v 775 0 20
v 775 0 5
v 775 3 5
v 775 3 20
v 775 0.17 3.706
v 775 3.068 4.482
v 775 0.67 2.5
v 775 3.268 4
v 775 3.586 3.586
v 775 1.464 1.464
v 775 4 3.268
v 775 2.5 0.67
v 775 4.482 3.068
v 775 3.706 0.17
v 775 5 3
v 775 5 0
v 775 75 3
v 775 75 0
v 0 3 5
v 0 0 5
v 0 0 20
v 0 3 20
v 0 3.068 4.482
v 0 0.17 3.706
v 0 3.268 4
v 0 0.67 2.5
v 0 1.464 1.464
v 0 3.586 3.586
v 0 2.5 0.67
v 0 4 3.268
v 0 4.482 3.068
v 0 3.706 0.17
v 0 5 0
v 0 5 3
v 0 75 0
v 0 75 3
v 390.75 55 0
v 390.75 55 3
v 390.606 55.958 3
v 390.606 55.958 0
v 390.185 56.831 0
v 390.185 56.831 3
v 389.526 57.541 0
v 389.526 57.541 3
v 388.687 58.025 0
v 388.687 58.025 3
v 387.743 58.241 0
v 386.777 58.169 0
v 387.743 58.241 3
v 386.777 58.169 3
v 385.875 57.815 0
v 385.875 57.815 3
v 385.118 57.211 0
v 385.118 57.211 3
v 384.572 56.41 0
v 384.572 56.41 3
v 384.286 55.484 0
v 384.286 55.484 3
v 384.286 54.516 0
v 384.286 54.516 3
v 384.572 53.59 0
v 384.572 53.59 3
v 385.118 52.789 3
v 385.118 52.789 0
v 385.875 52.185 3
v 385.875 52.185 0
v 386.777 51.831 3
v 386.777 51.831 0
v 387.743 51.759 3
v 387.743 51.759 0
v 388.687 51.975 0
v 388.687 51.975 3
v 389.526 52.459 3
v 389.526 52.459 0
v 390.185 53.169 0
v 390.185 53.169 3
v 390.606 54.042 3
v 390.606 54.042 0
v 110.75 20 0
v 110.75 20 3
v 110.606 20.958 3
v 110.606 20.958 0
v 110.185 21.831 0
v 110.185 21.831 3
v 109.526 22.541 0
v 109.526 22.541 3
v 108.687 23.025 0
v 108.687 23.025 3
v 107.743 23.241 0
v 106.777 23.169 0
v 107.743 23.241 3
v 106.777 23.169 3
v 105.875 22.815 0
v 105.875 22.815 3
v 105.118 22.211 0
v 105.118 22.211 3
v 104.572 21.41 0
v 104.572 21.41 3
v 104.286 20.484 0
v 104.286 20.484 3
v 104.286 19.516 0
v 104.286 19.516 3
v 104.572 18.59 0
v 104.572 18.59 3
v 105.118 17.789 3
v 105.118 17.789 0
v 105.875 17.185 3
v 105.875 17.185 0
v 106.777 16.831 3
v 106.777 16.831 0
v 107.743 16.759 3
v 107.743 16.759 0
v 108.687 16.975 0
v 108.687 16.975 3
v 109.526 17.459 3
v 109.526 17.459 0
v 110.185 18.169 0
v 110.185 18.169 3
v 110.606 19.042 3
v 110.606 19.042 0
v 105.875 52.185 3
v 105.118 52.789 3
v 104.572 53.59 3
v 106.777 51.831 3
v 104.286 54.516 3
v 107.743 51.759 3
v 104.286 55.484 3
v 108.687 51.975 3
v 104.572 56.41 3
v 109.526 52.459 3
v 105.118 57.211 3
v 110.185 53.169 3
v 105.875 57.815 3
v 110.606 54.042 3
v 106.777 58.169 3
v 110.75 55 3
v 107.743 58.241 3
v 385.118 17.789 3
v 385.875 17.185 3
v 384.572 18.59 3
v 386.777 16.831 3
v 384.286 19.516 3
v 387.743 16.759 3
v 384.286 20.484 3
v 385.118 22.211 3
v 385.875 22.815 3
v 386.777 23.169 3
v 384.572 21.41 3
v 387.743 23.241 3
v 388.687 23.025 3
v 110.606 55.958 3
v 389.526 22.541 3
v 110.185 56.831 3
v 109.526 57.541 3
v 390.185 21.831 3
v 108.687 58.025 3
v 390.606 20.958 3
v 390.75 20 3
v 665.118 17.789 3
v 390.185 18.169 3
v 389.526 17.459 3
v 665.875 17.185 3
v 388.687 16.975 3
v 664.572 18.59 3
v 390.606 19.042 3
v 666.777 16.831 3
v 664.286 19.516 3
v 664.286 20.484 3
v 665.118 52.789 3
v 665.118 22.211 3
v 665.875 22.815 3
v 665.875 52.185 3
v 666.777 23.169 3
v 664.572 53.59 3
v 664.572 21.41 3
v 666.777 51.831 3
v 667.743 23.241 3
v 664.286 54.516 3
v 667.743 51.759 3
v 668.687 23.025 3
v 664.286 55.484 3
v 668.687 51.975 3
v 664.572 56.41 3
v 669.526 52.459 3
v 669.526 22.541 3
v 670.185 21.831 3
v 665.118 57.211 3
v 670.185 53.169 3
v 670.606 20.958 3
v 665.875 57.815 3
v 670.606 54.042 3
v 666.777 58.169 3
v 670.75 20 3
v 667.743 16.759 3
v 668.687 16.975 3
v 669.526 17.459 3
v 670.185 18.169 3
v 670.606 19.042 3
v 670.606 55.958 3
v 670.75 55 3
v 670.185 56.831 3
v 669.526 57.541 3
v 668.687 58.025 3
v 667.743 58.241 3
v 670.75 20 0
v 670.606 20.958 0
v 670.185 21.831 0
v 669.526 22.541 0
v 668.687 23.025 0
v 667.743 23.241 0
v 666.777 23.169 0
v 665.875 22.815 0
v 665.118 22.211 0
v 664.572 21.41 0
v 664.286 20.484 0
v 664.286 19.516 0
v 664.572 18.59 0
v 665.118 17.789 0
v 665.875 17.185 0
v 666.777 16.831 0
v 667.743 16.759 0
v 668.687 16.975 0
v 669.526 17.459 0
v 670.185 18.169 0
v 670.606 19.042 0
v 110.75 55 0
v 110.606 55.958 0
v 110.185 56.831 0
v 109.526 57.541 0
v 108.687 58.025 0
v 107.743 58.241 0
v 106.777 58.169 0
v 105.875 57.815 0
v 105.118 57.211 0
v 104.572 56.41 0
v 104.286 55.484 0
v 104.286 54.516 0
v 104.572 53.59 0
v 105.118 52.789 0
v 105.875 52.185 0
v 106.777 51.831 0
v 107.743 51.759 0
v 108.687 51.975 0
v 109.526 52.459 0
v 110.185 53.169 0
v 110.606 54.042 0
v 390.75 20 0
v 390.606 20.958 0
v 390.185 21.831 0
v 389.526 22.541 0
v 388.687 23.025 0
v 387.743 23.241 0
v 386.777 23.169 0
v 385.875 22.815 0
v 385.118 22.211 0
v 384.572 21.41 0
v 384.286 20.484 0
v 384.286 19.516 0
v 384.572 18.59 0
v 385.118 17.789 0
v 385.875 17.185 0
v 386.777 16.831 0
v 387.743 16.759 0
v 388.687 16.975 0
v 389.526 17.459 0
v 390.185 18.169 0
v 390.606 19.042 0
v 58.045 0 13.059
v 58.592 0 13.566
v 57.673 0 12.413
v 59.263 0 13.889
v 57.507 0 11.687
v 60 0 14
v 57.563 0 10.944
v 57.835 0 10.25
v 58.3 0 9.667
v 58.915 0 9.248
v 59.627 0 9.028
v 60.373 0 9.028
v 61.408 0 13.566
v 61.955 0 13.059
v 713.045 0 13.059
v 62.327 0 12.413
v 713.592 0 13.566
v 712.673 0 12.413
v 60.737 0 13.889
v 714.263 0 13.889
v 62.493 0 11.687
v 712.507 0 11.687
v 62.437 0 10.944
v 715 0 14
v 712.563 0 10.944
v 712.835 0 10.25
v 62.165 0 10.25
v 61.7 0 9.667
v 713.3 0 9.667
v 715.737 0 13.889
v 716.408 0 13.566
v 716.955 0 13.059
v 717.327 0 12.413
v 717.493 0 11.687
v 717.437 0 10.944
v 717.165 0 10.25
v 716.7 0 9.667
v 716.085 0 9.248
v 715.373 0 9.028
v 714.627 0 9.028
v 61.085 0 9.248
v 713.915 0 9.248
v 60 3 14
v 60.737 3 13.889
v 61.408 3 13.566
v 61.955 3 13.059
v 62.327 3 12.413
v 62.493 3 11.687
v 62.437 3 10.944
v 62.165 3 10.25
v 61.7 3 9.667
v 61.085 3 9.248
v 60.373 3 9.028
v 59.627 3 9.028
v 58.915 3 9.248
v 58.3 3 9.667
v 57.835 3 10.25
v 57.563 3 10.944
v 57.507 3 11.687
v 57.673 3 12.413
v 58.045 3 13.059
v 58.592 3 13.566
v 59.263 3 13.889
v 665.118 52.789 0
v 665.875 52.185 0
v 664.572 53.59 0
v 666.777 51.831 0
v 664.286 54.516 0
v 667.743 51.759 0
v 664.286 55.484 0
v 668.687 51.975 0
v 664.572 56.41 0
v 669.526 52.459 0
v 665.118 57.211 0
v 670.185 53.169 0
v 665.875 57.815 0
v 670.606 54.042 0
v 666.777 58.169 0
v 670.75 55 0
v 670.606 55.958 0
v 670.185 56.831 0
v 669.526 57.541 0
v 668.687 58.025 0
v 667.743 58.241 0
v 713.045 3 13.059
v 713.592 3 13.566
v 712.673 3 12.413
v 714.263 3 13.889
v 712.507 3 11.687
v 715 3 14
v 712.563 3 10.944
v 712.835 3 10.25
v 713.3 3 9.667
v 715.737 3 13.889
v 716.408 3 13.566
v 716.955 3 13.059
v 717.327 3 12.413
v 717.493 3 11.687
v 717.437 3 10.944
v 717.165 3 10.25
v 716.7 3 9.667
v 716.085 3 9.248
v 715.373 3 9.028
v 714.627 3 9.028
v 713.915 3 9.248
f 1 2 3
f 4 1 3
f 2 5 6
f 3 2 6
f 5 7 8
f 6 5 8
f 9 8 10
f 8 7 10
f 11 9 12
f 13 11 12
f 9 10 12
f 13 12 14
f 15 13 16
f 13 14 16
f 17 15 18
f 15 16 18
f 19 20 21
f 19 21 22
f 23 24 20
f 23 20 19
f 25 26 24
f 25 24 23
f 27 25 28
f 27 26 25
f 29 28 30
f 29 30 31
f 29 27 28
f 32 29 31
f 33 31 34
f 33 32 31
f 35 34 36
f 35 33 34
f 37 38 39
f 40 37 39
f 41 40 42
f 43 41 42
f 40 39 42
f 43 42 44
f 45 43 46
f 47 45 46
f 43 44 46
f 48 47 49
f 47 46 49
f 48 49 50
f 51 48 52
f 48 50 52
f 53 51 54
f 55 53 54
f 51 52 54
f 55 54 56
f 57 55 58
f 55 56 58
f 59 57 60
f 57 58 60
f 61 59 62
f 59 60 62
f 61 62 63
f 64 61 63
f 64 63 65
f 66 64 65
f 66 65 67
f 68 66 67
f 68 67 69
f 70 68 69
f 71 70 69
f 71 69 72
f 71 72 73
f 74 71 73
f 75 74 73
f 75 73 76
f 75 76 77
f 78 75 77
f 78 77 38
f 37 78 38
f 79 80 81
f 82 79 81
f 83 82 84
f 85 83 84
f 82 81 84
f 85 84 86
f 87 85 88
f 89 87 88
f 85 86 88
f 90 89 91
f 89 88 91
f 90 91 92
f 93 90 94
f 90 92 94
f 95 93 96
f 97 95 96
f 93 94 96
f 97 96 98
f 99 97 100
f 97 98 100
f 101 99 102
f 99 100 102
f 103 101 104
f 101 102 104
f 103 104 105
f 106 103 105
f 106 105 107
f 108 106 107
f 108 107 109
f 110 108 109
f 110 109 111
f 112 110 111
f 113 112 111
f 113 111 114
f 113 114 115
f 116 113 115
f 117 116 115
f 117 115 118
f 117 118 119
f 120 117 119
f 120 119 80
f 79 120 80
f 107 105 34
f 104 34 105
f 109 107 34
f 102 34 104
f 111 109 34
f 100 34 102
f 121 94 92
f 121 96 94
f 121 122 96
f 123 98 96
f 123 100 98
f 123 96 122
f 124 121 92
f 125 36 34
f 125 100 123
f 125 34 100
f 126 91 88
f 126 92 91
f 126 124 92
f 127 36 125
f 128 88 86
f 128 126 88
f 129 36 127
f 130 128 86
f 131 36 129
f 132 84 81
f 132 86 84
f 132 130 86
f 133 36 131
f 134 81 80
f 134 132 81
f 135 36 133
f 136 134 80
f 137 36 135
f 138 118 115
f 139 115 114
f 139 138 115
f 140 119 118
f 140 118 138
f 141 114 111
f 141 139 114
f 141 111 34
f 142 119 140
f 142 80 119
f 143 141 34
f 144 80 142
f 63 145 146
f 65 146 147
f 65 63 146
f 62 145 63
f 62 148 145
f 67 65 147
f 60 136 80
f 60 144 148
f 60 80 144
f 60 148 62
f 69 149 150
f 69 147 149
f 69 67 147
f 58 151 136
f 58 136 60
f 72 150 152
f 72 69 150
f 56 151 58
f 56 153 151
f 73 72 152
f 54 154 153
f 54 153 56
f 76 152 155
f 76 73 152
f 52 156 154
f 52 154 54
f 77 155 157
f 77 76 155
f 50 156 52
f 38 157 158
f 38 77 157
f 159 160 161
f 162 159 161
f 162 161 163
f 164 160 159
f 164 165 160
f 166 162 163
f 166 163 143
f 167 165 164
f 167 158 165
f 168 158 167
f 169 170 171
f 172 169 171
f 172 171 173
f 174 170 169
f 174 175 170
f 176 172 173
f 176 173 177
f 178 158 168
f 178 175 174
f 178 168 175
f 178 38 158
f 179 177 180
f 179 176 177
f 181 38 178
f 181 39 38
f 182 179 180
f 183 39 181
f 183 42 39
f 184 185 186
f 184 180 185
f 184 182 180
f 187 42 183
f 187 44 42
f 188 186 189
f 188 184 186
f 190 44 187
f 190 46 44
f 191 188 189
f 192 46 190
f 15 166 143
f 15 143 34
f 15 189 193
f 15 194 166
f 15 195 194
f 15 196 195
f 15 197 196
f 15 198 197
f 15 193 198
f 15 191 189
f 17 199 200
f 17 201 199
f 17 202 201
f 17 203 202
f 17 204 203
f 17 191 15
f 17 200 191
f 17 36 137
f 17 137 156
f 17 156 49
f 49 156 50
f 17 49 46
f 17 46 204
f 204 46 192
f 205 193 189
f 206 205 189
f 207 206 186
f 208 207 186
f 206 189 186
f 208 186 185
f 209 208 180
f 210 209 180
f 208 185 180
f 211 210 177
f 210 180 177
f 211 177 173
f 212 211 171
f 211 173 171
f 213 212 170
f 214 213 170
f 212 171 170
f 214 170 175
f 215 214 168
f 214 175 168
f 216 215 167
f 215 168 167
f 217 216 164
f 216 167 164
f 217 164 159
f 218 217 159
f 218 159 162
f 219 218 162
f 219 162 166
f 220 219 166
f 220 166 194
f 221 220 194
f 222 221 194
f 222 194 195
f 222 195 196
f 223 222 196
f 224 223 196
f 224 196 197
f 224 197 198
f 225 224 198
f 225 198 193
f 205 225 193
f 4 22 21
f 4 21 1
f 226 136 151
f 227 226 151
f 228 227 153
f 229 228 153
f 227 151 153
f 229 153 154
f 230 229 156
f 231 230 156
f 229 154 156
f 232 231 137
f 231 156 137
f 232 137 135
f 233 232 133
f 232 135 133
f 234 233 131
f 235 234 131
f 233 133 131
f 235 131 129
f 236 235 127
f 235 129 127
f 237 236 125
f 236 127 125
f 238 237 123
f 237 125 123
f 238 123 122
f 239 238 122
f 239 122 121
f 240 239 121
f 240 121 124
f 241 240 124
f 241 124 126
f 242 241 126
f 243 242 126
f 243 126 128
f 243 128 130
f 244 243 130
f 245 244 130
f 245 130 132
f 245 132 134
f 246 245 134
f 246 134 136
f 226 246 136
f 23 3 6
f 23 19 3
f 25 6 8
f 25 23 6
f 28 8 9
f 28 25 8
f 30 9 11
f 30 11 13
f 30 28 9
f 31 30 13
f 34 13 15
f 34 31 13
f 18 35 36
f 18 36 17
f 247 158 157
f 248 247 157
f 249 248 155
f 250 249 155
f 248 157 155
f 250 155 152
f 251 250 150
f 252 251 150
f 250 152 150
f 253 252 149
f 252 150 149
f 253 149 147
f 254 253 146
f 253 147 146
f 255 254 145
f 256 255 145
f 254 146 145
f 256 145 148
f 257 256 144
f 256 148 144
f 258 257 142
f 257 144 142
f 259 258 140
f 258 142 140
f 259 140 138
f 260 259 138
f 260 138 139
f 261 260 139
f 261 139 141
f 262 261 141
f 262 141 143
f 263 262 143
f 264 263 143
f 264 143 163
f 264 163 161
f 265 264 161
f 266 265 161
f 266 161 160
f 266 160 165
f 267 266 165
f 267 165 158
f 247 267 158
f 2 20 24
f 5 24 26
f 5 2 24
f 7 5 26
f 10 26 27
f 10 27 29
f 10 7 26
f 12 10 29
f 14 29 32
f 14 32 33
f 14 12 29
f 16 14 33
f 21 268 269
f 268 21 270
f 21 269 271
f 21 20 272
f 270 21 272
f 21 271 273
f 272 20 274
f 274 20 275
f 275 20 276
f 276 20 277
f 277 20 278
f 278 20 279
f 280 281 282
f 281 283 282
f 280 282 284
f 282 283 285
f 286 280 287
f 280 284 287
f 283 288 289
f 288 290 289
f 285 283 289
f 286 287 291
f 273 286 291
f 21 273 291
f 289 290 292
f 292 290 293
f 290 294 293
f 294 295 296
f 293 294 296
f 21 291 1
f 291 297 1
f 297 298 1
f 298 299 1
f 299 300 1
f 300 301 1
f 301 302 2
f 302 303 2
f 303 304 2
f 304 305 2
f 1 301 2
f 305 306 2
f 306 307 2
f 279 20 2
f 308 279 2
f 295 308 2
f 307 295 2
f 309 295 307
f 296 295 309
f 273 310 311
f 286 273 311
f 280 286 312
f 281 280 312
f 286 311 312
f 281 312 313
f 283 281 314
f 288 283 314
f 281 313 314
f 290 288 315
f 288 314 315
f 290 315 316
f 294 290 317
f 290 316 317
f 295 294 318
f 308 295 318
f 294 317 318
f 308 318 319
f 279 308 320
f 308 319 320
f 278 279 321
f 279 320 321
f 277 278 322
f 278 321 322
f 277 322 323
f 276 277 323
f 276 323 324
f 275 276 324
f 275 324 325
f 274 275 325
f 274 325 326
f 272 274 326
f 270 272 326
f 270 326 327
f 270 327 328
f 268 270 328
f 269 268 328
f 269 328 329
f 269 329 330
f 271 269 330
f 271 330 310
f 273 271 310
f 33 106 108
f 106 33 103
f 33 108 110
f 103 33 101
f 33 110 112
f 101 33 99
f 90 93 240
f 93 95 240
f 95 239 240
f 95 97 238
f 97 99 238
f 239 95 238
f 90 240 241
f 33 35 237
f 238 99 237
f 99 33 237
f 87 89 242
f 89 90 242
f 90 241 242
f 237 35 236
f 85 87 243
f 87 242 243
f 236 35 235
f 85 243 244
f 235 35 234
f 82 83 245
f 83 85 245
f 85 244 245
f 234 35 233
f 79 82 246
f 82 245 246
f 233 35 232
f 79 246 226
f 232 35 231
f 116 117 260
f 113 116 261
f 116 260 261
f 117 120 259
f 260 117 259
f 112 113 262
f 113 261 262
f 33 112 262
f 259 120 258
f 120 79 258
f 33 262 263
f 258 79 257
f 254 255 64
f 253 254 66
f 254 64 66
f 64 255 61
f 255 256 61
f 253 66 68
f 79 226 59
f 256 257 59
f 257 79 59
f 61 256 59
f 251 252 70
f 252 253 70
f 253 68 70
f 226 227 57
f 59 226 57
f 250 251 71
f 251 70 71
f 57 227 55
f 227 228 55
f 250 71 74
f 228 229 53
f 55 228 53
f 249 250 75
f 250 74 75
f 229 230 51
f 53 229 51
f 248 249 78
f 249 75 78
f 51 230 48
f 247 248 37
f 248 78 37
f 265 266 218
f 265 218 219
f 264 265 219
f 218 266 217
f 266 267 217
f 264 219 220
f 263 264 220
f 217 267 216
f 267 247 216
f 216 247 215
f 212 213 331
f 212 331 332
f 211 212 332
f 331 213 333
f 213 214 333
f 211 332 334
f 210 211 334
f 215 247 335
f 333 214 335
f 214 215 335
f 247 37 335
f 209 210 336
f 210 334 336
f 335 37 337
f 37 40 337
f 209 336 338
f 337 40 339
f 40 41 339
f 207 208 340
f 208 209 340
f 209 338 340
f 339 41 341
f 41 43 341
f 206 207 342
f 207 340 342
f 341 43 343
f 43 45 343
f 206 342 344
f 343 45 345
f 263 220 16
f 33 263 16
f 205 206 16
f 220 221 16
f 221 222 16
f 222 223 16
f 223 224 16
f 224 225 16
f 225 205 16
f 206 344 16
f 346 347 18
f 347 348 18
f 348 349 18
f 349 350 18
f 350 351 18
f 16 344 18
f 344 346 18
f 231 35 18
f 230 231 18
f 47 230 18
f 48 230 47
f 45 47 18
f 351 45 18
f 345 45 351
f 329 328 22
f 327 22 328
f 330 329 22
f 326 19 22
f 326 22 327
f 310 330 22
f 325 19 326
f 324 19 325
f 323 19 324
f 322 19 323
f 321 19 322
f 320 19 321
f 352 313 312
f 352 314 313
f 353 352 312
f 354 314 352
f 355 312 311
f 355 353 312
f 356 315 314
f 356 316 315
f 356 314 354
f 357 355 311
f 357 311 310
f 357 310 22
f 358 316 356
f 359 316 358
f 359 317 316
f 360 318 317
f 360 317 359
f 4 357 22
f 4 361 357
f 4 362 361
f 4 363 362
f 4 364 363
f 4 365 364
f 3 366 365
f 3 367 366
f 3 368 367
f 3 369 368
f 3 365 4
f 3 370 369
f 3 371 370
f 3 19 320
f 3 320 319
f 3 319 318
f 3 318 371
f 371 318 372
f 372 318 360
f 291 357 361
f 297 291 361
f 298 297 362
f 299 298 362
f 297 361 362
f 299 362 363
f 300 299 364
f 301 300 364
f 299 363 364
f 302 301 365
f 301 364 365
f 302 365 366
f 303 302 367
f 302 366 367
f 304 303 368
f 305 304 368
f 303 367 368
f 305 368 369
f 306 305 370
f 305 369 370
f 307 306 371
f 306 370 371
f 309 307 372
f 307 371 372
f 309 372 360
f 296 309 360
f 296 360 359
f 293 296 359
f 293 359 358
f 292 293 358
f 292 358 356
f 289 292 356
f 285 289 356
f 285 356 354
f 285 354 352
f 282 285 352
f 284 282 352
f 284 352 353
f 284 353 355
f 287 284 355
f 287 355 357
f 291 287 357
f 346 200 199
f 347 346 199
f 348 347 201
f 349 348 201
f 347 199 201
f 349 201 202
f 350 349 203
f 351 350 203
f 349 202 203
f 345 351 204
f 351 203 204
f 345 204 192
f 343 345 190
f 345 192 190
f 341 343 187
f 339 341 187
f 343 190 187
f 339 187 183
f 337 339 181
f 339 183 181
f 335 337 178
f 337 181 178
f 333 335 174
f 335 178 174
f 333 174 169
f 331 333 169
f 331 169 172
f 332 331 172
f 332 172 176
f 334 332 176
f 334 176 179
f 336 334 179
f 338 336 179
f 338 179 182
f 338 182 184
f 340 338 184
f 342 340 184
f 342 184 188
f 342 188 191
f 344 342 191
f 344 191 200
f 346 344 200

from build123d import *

# Parameters (mm, degrees)
SKETCH_1_W          = 775
SKETCH_1_H          = 75
EXTRUDE_1_DEPTH     = 3
EXTRUDE_START       = -3
SKETCH_2_W          = 775
SKETCH_2_H          = 3
EXTRUDE_2_DEPTH     = 20
SKETCH_3_R          = 3.25
CUT_EXTRUDE_1_DEPTH = 779.806137623
FILLET_1_R          = 5
SKETCH_4_R          = 2.5
CUT_EXTRUDE_2_DEPTH = 779.594246061
FILLET_2_R          = 2


with BuildPart() as part:
    # 스케치1 → 보스-돌출1 (new body)
    with BuildSketch(Plane.XY):
        with Locations((387.5, 37.5)):
            Rectangle(SKETCH_1_W, SKETCH_1_H)
    extrude(amount=EXTRUDE_1_DEPTH)

    # 스케치2 → 보스-돌출2 (add)
    with BuildSketch(Plane.XY.offset(3).offset(EXTRUDE_START)):
        with Locations((387.5, 1.5)):
            Rectangle(SKETCH_2_W, SKETCH_2_H)
    extrude(amount=EXTRUDE_2_DEPTH)

    # 스케치3 → 컷-돌출1 (cut, through all)
    with BuildSketch(Plane.XY.offset(3)):
        with Locations((107.5, 55)):
            Circle(SKETCH_3_R)
        with Locations((107.5, 20)):
            Circle(SKETCH_3_R)
        with Locations((387.5, 55)):
            Circle(SKETCH_3_R)
        with Locations((387.5, 20)):
            Circle(SKETCH_3_R)
        with Locations((667.5, 55)):
            Circle(SKETCH_3_R)
        with Locations((667.5, 20)):
            Circle(SKETCH_3_R)
    extrude(amount=-CUT_EXTRUDE_1_DEPTH, mode=Mode.SUBTRACT)

    # 필렛1
    fillet_1_edges = [part.edges().sort_by_distance(p)[0] for p in [
        (387.5, 0, 0),
    ]]
    fillet(fillet_1_edges, radius=FILLET_1_R)

    # 스케치4 → 컷-돌출2 (cut, through all)
    with BuildSketch(Plane(origin=(0, 3, 0), x_dir=(1, 0, 0), z_dir=(0, 1, 0))):
        with Locations(Location((60, -11.5, 0), (0, 0, 270))):
            Circle(SKETCH_4_R)
        with Locations(Location((715, -11.5, 0), (0, 0, 270))):
            Circle(SKETCH_4_R)
    extrude(amount=-CUT_EXTRUDE_2_DEPTH, mode=Mode.SUBTRACT)

    # 필렛2
    fillet_2_edges = [part.edges().sort_by_distance(p)[0] for p in [
        (387.5, 3, 3),
    ]]
    fillet(fillet_2_edges, radius=FILLET_2_R)


solid = part.part
